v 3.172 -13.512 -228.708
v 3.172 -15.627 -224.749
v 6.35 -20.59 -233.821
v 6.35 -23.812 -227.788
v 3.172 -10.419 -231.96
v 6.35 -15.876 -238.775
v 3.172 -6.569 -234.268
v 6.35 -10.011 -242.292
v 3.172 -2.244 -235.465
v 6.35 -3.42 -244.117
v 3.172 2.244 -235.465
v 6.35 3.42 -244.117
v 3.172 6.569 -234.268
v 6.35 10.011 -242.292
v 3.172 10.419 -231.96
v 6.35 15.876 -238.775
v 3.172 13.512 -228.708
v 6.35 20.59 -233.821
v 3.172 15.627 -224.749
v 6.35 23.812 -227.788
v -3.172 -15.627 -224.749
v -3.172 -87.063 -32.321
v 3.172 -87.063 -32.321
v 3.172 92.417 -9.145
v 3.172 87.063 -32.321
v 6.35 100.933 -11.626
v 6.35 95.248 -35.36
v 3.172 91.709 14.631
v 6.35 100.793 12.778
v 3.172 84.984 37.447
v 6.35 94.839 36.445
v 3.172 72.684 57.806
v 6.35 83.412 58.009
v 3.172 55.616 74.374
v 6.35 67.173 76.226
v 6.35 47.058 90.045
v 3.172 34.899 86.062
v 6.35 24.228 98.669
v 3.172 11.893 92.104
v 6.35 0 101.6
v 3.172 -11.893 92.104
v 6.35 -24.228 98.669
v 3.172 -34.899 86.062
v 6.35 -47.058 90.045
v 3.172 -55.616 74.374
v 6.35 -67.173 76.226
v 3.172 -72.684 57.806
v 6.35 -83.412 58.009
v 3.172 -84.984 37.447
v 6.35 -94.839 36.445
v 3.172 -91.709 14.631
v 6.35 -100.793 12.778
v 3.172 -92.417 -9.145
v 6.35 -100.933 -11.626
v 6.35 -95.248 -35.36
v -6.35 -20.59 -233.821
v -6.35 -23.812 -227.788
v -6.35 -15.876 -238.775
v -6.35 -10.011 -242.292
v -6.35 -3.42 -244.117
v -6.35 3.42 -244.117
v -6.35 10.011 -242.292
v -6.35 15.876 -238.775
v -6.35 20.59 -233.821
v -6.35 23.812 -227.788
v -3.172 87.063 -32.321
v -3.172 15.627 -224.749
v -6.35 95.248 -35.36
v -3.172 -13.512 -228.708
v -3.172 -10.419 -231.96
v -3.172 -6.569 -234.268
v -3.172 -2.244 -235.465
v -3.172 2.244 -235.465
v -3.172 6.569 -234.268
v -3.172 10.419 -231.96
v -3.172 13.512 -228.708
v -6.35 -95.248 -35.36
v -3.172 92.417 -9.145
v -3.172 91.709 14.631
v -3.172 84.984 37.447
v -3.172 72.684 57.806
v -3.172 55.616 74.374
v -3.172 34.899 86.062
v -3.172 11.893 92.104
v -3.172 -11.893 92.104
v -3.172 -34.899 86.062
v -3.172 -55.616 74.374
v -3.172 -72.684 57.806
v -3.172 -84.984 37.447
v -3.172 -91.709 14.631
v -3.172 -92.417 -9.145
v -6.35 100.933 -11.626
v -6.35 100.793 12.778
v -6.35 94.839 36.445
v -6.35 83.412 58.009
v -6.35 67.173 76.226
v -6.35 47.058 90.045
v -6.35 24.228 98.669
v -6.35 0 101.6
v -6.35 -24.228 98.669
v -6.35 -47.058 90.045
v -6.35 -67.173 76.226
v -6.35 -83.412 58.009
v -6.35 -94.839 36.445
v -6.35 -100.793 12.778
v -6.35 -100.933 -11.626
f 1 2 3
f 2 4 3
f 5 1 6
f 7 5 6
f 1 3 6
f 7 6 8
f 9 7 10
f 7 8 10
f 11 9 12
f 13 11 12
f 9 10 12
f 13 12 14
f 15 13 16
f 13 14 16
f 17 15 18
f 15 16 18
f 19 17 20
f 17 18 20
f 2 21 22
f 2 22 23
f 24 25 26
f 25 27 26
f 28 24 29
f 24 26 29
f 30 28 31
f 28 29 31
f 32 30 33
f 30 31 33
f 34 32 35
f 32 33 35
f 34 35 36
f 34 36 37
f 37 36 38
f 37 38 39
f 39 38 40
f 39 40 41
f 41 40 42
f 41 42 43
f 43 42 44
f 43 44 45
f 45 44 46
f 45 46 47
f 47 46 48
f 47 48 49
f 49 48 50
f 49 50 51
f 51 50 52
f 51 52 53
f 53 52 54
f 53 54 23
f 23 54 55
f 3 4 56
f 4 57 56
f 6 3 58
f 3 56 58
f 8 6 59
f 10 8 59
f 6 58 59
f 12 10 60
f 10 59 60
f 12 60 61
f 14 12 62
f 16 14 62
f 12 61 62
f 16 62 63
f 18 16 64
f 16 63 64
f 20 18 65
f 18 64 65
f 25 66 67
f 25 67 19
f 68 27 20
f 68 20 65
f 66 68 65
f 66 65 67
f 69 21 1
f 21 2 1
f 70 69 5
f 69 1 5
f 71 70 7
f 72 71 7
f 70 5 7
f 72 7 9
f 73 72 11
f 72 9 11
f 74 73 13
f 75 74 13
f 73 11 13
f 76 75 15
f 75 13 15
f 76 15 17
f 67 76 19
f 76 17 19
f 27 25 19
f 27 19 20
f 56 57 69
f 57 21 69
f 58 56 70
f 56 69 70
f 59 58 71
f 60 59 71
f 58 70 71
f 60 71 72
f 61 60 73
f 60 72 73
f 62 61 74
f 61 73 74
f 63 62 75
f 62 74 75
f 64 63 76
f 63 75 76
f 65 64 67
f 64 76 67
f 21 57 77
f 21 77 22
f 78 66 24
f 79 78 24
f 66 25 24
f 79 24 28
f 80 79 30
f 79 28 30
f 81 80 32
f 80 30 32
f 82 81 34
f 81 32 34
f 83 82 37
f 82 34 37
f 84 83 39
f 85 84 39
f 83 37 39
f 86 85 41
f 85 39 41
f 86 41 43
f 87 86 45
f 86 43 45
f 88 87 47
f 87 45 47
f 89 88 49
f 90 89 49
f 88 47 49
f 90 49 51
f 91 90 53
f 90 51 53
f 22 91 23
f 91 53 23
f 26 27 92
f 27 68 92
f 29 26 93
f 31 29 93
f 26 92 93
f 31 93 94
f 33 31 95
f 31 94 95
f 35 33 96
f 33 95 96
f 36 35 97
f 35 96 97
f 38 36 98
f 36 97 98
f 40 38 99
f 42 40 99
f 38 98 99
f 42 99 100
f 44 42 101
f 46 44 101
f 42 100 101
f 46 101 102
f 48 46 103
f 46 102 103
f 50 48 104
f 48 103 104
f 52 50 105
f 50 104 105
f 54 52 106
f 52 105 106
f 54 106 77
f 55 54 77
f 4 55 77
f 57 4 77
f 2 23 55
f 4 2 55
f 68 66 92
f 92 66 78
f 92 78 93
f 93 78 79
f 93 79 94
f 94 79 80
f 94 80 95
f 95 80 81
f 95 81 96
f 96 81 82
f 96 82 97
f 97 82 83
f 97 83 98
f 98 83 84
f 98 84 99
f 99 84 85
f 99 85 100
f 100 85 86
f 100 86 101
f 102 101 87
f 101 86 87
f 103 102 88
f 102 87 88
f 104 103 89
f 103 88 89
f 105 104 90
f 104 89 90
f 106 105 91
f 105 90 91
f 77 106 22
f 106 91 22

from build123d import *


with BuildPart() as part:
    # Barrer1: sweep along a path in Croquis1
    with BuildLine(Plane(origin=(0, 0, 0), x_dir=(0, 0, -1), z_dir=(1, 0, 0))) as barrer1_path:
        Line((227.787907193, 23.812098623), (35.35962877, 95.248394492))
        ThreePointArc((35.35962877, 95.248394492), (-101.6, 0), (35.35962877, -95.248394492))
        Line((35.35962877, -95.248394492), (227.787907193, -23.812098623))
        ThreePointArc((227.787907193, -23.812098623), (244.348, 0), (227.787907193, 23.812098623))
    # Croquis2 → Barrer1 (sweep)
    with BuildSketch(Plane.XY):
        Polygon((-6.35, 101.6), (6.35, 101.6), (3.172084892, 92.86875), (-3.172084892, 92.86875), align=None)
    sweep(path=barrer1_path.line)


solid = part.part
